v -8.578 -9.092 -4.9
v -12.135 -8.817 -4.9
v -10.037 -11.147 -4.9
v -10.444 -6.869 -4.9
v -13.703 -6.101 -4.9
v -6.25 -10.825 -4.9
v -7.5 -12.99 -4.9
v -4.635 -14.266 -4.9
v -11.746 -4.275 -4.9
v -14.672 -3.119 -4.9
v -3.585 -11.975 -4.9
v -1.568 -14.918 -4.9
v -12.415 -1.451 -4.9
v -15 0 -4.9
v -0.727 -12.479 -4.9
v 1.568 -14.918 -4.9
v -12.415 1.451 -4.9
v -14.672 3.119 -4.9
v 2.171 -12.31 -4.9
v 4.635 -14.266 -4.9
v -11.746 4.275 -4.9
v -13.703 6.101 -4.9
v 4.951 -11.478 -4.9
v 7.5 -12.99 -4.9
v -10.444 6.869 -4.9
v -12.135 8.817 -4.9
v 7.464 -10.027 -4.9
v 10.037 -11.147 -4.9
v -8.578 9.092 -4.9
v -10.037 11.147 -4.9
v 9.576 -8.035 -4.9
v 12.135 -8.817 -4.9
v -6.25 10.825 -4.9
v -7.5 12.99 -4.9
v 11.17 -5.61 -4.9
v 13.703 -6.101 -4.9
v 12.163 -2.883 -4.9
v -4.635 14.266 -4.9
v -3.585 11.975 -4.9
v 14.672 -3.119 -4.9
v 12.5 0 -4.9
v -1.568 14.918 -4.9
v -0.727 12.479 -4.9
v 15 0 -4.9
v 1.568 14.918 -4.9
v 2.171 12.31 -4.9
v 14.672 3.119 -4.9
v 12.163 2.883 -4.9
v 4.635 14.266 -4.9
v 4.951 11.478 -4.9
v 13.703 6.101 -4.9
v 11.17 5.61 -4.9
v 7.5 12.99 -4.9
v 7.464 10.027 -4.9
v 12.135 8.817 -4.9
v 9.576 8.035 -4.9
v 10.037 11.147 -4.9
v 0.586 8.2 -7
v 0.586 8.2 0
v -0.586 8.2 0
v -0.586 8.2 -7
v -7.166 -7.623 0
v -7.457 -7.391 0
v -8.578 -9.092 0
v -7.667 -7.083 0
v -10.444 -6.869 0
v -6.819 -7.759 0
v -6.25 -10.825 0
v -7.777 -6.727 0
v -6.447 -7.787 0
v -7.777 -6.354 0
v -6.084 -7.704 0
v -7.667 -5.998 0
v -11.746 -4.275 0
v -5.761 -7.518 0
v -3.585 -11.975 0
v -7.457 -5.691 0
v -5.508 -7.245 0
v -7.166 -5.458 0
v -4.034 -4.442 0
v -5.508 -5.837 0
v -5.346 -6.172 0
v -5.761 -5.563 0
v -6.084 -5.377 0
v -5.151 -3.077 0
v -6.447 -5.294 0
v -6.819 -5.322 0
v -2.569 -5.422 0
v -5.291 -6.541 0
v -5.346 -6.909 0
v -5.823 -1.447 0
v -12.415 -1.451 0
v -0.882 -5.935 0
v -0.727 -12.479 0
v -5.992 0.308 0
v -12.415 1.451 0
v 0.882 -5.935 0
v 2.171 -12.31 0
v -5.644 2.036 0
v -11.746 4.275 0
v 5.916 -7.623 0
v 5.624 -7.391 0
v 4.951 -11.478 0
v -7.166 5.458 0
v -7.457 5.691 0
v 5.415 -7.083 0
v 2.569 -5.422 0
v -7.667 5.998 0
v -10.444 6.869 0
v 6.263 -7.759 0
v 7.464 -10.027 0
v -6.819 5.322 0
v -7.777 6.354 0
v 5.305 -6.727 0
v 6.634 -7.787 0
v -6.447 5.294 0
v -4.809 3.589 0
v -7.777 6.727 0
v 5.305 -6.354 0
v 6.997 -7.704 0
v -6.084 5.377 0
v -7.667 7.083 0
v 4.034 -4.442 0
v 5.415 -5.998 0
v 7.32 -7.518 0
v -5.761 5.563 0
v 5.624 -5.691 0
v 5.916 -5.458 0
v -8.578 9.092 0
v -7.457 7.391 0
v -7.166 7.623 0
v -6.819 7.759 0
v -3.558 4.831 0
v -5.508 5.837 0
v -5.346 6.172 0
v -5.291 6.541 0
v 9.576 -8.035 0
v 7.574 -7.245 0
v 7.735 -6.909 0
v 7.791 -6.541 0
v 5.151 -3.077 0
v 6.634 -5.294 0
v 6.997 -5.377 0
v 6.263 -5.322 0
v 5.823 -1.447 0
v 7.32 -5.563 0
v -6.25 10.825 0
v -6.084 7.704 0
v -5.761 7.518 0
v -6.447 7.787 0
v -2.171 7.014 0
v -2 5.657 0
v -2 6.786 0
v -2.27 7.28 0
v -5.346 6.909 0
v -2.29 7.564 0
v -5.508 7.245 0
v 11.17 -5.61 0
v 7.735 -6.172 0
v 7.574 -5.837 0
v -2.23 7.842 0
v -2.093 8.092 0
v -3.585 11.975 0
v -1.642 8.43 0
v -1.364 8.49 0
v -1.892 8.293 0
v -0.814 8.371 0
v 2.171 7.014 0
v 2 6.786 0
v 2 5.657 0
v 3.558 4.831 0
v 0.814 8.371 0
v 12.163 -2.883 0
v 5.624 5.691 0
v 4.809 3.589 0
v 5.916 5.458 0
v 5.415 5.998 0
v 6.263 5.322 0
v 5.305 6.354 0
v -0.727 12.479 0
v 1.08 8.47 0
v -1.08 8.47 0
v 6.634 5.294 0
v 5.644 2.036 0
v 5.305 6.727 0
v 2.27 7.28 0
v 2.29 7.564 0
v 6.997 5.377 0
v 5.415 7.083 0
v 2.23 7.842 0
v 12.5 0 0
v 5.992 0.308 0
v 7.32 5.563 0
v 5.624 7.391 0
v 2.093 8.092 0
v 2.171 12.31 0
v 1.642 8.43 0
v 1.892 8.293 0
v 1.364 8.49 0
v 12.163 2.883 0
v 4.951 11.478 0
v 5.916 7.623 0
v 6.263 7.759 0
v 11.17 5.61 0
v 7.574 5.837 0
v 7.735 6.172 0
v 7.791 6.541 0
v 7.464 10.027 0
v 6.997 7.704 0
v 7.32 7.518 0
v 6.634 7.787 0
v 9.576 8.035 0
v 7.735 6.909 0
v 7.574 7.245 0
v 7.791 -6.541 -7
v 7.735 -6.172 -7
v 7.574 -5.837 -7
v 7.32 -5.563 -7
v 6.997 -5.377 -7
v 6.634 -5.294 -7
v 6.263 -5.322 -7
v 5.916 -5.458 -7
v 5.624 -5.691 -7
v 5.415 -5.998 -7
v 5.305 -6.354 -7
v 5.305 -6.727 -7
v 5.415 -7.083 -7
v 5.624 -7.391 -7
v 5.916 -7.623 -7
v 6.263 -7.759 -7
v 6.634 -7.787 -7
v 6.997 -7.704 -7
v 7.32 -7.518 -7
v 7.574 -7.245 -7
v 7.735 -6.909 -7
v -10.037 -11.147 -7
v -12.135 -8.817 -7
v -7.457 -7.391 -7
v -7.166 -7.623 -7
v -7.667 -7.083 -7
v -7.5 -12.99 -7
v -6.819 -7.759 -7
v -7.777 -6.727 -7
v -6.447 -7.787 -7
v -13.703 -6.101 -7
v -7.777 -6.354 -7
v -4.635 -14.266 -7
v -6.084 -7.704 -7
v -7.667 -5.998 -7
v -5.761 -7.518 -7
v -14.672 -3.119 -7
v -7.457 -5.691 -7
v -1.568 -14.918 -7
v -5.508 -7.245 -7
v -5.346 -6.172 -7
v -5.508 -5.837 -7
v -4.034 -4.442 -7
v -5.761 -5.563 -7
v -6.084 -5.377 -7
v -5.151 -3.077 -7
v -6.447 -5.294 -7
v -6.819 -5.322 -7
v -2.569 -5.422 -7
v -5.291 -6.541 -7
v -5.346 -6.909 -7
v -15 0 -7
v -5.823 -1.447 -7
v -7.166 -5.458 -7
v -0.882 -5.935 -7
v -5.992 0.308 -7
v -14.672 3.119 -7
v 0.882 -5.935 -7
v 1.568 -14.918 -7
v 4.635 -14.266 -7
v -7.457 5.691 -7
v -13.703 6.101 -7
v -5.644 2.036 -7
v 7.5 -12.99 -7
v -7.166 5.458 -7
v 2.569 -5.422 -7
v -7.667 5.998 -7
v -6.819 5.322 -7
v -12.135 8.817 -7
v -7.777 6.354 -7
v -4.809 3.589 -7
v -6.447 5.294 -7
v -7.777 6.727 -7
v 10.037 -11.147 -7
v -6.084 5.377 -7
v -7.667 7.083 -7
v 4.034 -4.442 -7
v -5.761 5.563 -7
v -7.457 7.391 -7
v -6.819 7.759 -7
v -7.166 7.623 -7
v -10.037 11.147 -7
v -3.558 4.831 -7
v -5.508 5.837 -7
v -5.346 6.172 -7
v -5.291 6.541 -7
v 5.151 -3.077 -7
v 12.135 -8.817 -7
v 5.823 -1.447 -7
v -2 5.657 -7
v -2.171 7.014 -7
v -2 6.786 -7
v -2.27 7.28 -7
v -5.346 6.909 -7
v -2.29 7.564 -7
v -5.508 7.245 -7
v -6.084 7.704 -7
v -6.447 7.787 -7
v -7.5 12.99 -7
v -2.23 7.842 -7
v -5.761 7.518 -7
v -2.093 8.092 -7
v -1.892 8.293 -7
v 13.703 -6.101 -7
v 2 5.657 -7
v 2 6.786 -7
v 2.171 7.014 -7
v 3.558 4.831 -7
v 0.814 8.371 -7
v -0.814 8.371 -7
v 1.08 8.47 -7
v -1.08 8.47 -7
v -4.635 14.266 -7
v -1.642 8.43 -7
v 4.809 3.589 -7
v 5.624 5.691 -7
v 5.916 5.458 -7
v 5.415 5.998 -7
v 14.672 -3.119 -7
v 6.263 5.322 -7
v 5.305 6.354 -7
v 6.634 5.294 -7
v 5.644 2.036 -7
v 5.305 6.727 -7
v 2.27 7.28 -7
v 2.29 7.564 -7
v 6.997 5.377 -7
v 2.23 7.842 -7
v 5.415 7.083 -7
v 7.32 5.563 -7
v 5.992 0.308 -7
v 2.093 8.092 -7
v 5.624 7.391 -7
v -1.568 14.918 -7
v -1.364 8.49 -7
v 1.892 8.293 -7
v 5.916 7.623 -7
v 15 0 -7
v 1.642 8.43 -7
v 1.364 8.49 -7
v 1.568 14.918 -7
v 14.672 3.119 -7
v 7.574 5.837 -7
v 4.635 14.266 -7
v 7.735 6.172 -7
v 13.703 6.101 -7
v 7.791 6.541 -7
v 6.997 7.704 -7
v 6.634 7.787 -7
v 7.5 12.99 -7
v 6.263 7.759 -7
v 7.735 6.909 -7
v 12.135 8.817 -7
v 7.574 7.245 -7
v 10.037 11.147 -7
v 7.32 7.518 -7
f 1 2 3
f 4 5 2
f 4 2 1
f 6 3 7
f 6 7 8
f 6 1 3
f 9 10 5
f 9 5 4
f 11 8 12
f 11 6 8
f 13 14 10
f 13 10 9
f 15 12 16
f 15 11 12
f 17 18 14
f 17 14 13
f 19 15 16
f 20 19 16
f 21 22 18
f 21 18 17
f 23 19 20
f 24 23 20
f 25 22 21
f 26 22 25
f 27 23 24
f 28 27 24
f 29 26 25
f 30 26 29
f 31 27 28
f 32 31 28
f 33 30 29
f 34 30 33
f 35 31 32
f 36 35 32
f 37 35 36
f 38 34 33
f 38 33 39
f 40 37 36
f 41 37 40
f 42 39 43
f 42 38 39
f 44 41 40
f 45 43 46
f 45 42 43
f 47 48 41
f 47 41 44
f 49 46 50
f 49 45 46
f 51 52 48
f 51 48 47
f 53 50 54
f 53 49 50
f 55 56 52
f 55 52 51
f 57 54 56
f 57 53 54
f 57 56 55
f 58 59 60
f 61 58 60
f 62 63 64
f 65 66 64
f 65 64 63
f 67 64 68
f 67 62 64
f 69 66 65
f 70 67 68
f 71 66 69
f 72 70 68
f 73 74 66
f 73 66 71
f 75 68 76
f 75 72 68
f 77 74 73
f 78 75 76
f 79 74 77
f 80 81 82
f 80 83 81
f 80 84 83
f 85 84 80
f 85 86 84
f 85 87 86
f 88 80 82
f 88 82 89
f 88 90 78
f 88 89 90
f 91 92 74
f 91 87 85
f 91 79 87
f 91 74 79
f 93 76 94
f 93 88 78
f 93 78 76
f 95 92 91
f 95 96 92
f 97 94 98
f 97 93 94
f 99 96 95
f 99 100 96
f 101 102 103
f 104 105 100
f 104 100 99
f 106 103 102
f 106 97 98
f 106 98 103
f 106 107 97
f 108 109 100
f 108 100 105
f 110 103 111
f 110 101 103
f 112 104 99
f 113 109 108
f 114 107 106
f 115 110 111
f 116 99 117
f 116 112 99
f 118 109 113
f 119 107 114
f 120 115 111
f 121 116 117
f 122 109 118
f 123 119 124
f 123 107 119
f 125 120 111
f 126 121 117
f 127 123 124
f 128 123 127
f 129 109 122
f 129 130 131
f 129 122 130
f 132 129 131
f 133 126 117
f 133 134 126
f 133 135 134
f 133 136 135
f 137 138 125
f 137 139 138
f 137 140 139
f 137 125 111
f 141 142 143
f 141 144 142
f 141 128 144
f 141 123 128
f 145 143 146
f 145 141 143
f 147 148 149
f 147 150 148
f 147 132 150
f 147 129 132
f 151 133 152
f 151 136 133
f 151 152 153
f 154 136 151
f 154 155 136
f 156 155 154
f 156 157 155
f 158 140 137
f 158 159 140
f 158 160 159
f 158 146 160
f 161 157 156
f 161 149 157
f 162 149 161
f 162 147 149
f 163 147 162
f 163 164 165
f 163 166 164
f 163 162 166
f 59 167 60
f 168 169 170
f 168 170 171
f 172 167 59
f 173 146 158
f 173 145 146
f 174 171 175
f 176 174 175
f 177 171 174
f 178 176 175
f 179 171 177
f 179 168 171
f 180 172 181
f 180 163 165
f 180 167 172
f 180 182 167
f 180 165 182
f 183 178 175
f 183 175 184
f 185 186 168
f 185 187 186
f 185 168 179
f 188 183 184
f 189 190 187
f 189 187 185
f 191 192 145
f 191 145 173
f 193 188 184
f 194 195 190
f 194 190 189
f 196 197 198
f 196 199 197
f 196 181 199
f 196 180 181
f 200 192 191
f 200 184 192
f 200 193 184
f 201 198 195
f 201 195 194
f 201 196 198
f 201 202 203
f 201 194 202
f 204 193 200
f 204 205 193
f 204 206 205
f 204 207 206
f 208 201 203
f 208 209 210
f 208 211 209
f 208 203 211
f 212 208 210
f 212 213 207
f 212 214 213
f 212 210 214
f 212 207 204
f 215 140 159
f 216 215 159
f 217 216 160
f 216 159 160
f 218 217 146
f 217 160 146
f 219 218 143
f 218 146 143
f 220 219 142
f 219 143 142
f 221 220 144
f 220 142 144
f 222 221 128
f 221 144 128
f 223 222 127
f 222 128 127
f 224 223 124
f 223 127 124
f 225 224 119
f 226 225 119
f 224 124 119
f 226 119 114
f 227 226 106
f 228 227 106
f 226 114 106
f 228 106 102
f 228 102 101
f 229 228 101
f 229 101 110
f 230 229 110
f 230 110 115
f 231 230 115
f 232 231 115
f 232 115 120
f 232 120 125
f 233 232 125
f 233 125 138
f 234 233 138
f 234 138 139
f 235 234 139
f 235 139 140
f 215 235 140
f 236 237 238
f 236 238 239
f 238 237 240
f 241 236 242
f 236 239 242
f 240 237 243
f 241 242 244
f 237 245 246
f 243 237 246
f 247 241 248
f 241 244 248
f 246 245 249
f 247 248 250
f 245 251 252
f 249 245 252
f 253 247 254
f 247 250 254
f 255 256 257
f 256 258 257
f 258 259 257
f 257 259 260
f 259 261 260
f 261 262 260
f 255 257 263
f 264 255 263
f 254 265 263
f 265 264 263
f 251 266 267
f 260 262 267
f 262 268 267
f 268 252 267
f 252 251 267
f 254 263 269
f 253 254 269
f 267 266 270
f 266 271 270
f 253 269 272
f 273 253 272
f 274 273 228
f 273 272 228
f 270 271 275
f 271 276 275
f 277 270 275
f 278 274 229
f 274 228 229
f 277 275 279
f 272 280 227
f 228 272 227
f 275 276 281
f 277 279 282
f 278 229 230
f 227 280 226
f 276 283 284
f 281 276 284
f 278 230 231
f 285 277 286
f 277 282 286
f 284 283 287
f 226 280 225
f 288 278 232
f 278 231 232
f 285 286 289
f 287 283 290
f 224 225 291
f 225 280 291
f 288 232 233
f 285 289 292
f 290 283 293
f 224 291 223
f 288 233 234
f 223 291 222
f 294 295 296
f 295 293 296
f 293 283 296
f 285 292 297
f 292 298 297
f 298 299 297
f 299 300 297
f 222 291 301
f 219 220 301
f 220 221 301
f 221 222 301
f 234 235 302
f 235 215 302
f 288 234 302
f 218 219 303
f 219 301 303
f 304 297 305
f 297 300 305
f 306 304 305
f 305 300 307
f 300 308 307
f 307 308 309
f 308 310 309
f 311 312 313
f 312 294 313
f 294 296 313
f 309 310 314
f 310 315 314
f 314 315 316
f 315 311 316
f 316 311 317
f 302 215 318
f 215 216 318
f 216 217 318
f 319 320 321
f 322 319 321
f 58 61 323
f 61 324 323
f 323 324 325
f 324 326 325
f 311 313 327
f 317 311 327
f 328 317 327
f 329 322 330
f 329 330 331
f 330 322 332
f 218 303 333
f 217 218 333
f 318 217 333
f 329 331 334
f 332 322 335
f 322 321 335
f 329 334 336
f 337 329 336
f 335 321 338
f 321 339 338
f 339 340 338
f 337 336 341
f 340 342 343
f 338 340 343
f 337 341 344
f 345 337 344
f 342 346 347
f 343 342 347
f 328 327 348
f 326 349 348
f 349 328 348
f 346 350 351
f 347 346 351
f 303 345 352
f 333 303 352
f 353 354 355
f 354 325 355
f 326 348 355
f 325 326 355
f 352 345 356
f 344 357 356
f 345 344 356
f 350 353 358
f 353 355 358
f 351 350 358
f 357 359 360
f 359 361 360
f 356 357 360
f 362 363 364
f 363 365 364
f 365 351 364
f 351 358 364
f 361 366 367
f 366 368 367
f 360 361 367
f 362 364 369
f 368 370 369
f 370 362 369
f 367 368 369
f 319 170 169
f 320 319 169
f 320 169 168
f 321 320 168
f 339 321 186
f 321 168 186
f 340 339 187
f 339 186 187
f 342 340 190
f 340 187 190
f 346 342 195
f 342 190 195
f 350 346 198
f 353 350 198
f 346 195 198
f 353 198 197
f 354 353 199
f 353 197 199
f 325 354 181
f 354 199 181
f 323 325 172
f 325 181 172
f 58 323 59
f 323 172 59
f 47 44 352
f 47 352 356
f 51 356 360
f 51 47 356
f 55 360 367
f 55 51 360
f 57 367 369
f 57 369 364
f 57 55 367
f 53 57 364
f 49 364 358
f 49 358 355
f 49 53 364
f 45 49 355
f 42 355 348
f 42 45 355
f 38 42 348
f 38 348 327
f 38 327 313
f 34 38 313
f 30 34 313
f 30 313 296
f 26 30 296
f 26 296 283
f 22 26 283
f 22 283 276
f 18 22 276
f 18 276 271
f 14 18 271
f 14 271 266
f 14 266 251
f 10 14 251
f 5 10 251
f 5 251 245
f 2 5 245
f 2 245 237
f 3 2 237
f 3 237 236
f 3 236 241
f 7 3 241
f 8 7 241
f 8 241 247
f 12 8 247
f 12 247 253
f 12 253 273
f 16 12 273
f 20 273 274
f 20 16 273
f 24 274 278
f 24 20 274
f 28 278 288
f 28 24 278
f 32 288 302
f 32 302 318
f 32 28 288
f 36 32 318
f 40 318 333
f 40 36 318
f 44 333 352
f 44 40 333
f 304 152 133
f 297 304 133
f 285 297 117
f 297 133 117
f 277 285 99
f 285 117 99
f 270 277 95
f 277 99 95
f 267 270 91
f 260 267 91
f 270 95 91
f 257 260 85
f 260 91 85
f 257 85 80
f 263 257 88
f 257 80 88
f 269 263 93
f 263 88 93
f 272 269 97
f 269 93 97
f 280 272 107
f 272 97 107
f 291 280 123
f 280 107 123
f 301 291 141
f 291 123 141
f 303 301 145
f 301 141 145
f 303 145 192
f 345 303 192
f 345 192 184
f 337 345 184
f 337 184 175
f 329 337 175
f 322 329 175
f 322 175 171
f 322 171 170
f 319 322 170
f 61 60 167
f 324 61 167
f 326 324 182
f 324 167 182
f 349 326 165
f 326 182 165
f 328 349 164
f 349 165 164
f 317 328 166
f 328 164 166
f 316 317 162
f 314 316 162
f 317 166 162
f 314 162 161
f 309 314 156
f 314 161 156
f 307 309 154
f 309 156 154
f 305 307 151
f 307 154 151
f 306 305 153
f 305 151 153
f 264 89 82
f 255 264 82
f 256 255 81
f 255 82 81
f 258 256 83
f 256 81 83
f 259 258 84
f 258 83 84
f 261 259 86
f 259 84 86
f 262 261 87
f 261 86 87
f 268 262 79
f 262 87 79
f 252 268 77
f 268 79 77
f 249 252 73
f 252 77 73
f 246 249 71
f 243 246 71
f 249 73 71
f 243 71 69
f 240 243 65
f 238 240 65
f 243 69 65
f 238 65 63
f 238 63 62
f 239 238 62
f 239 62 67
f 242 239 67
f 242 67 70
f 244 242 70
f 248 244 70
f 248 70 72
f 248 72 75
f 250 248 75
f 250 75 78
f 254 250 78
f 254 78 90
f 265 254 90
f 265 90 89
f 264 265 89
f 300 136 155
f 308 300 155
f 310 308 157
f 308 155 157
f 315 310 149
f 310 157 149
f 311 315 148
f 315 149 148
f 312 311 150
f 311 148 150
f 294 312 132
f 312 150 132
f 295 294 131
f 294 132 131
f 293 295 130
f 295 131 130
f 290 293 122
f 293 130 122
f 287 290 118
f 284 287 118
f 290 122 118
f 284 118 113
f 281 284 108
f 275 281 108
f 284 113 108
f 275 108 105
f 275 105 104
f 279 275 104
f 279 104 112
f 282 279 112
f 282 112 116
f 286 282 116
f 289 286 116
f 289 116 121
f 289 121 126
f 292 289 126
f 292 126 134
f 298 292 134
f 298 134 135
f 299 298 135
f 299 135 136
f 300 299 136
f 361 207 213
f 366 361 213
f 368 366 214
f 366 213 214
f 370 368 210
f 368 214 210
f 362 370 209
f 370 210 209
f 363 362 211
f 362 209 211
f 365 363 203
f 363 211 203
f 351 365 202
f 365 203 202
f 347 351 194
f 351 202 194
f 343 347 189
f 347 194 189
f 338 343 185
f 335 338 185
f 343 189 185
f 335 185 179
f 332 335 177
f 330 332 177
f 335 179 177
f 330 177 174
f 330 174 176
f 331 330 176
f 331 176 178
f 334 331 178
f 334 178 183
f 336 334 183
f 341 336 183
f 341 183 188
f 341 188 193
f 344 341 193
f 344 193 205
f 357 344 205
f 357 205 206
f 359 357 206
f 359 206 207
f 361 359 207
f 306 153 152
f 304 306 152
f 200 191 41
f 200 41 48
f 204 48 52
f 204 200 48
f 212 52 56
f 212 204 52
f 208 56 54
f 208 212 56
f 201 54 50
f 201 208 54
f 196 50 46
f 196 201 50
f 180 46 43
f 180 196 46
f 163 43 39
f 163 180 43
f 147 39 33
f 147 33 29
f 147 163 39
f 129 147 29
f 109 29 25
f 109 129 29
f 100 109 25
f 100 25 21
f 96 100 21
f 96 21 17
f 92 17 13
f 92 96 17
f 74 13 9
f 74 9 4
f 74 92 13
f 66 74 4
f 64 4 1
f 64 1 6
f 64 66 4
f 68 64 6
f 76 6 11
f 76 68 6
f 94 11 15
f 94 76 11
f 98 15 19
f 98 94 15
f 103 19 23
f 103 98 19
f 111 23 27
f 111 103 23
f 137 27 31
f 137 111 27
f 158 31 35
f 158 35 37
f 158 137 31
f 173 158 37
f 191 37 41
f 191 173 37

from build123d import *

# Parameters (mm, degrees)
SKETCH_1_12_R       = 15
EXTRUDE_2_DEPTH     = 7
SKETCH_1_13_R       = 15
SKETCH_1_13_R_2     = 12.5
CUT_EXTRUDE_5_DEPTH = 4.9
M3X0_5_2_D          = 2.5


with BuildPart() as part:
    # ｽｹｯﾁ1<12> → ﾎﾞｽ - 押し出し2 (new body)
    with BuildSketch(Plane.XY):
        Circle(SKETCH_1_12_R)
        with BuildLine():
            Line((-2, 6.785786438), (-2, 5.656854249))
            ThreePointArc((-2, 5.656854249), (0, -6), (2, 5.656854249))
            Line((2, 5.656854249), (2, 6.785786438))
            ThreePointArc((2, 6.785786438), (2, 8.2), (0.585786438, 8.2))
            Line((0.585786438, 8.2), (-0.585786438, 8.2))
            ThreePointArc((-0.585786438, 8.2), (-2, 8.2), (-2, 6.785786438))
        make_face(mode=Mode.SUBTRACT)
    extrude(amount=-EXTRUDE_2_DEPTH)

    # ｽｹｯﾁ1<13> → ｶｯﾄ - 押し出し5 (cut)
    with BuildSketch(Plane.XY):
        Circle(SKETCH_1_13_R)
        Circle(SKETCH_1_13_R_2, mode=Mode.SUBTRACT)
    extrude(amount=-CUT_EXTRUDE_5_DEPTH, mode=Mode.SUBTRACT)

    # M3x0.5 ねじ穴2 (through all)
    with Locations(Plane(origin=(-6.540737726, 6.540737726, -7), x_dir=(-1, 0, 0), z_dir=(0, 0, -1))):
        with Locations((0, 0), (0, -13.081475452), (-13.081475452, -13.081475452), (-13.081475452, 0)):
            Hole(M3X0_5_2_D / 2)


solid = part.part
